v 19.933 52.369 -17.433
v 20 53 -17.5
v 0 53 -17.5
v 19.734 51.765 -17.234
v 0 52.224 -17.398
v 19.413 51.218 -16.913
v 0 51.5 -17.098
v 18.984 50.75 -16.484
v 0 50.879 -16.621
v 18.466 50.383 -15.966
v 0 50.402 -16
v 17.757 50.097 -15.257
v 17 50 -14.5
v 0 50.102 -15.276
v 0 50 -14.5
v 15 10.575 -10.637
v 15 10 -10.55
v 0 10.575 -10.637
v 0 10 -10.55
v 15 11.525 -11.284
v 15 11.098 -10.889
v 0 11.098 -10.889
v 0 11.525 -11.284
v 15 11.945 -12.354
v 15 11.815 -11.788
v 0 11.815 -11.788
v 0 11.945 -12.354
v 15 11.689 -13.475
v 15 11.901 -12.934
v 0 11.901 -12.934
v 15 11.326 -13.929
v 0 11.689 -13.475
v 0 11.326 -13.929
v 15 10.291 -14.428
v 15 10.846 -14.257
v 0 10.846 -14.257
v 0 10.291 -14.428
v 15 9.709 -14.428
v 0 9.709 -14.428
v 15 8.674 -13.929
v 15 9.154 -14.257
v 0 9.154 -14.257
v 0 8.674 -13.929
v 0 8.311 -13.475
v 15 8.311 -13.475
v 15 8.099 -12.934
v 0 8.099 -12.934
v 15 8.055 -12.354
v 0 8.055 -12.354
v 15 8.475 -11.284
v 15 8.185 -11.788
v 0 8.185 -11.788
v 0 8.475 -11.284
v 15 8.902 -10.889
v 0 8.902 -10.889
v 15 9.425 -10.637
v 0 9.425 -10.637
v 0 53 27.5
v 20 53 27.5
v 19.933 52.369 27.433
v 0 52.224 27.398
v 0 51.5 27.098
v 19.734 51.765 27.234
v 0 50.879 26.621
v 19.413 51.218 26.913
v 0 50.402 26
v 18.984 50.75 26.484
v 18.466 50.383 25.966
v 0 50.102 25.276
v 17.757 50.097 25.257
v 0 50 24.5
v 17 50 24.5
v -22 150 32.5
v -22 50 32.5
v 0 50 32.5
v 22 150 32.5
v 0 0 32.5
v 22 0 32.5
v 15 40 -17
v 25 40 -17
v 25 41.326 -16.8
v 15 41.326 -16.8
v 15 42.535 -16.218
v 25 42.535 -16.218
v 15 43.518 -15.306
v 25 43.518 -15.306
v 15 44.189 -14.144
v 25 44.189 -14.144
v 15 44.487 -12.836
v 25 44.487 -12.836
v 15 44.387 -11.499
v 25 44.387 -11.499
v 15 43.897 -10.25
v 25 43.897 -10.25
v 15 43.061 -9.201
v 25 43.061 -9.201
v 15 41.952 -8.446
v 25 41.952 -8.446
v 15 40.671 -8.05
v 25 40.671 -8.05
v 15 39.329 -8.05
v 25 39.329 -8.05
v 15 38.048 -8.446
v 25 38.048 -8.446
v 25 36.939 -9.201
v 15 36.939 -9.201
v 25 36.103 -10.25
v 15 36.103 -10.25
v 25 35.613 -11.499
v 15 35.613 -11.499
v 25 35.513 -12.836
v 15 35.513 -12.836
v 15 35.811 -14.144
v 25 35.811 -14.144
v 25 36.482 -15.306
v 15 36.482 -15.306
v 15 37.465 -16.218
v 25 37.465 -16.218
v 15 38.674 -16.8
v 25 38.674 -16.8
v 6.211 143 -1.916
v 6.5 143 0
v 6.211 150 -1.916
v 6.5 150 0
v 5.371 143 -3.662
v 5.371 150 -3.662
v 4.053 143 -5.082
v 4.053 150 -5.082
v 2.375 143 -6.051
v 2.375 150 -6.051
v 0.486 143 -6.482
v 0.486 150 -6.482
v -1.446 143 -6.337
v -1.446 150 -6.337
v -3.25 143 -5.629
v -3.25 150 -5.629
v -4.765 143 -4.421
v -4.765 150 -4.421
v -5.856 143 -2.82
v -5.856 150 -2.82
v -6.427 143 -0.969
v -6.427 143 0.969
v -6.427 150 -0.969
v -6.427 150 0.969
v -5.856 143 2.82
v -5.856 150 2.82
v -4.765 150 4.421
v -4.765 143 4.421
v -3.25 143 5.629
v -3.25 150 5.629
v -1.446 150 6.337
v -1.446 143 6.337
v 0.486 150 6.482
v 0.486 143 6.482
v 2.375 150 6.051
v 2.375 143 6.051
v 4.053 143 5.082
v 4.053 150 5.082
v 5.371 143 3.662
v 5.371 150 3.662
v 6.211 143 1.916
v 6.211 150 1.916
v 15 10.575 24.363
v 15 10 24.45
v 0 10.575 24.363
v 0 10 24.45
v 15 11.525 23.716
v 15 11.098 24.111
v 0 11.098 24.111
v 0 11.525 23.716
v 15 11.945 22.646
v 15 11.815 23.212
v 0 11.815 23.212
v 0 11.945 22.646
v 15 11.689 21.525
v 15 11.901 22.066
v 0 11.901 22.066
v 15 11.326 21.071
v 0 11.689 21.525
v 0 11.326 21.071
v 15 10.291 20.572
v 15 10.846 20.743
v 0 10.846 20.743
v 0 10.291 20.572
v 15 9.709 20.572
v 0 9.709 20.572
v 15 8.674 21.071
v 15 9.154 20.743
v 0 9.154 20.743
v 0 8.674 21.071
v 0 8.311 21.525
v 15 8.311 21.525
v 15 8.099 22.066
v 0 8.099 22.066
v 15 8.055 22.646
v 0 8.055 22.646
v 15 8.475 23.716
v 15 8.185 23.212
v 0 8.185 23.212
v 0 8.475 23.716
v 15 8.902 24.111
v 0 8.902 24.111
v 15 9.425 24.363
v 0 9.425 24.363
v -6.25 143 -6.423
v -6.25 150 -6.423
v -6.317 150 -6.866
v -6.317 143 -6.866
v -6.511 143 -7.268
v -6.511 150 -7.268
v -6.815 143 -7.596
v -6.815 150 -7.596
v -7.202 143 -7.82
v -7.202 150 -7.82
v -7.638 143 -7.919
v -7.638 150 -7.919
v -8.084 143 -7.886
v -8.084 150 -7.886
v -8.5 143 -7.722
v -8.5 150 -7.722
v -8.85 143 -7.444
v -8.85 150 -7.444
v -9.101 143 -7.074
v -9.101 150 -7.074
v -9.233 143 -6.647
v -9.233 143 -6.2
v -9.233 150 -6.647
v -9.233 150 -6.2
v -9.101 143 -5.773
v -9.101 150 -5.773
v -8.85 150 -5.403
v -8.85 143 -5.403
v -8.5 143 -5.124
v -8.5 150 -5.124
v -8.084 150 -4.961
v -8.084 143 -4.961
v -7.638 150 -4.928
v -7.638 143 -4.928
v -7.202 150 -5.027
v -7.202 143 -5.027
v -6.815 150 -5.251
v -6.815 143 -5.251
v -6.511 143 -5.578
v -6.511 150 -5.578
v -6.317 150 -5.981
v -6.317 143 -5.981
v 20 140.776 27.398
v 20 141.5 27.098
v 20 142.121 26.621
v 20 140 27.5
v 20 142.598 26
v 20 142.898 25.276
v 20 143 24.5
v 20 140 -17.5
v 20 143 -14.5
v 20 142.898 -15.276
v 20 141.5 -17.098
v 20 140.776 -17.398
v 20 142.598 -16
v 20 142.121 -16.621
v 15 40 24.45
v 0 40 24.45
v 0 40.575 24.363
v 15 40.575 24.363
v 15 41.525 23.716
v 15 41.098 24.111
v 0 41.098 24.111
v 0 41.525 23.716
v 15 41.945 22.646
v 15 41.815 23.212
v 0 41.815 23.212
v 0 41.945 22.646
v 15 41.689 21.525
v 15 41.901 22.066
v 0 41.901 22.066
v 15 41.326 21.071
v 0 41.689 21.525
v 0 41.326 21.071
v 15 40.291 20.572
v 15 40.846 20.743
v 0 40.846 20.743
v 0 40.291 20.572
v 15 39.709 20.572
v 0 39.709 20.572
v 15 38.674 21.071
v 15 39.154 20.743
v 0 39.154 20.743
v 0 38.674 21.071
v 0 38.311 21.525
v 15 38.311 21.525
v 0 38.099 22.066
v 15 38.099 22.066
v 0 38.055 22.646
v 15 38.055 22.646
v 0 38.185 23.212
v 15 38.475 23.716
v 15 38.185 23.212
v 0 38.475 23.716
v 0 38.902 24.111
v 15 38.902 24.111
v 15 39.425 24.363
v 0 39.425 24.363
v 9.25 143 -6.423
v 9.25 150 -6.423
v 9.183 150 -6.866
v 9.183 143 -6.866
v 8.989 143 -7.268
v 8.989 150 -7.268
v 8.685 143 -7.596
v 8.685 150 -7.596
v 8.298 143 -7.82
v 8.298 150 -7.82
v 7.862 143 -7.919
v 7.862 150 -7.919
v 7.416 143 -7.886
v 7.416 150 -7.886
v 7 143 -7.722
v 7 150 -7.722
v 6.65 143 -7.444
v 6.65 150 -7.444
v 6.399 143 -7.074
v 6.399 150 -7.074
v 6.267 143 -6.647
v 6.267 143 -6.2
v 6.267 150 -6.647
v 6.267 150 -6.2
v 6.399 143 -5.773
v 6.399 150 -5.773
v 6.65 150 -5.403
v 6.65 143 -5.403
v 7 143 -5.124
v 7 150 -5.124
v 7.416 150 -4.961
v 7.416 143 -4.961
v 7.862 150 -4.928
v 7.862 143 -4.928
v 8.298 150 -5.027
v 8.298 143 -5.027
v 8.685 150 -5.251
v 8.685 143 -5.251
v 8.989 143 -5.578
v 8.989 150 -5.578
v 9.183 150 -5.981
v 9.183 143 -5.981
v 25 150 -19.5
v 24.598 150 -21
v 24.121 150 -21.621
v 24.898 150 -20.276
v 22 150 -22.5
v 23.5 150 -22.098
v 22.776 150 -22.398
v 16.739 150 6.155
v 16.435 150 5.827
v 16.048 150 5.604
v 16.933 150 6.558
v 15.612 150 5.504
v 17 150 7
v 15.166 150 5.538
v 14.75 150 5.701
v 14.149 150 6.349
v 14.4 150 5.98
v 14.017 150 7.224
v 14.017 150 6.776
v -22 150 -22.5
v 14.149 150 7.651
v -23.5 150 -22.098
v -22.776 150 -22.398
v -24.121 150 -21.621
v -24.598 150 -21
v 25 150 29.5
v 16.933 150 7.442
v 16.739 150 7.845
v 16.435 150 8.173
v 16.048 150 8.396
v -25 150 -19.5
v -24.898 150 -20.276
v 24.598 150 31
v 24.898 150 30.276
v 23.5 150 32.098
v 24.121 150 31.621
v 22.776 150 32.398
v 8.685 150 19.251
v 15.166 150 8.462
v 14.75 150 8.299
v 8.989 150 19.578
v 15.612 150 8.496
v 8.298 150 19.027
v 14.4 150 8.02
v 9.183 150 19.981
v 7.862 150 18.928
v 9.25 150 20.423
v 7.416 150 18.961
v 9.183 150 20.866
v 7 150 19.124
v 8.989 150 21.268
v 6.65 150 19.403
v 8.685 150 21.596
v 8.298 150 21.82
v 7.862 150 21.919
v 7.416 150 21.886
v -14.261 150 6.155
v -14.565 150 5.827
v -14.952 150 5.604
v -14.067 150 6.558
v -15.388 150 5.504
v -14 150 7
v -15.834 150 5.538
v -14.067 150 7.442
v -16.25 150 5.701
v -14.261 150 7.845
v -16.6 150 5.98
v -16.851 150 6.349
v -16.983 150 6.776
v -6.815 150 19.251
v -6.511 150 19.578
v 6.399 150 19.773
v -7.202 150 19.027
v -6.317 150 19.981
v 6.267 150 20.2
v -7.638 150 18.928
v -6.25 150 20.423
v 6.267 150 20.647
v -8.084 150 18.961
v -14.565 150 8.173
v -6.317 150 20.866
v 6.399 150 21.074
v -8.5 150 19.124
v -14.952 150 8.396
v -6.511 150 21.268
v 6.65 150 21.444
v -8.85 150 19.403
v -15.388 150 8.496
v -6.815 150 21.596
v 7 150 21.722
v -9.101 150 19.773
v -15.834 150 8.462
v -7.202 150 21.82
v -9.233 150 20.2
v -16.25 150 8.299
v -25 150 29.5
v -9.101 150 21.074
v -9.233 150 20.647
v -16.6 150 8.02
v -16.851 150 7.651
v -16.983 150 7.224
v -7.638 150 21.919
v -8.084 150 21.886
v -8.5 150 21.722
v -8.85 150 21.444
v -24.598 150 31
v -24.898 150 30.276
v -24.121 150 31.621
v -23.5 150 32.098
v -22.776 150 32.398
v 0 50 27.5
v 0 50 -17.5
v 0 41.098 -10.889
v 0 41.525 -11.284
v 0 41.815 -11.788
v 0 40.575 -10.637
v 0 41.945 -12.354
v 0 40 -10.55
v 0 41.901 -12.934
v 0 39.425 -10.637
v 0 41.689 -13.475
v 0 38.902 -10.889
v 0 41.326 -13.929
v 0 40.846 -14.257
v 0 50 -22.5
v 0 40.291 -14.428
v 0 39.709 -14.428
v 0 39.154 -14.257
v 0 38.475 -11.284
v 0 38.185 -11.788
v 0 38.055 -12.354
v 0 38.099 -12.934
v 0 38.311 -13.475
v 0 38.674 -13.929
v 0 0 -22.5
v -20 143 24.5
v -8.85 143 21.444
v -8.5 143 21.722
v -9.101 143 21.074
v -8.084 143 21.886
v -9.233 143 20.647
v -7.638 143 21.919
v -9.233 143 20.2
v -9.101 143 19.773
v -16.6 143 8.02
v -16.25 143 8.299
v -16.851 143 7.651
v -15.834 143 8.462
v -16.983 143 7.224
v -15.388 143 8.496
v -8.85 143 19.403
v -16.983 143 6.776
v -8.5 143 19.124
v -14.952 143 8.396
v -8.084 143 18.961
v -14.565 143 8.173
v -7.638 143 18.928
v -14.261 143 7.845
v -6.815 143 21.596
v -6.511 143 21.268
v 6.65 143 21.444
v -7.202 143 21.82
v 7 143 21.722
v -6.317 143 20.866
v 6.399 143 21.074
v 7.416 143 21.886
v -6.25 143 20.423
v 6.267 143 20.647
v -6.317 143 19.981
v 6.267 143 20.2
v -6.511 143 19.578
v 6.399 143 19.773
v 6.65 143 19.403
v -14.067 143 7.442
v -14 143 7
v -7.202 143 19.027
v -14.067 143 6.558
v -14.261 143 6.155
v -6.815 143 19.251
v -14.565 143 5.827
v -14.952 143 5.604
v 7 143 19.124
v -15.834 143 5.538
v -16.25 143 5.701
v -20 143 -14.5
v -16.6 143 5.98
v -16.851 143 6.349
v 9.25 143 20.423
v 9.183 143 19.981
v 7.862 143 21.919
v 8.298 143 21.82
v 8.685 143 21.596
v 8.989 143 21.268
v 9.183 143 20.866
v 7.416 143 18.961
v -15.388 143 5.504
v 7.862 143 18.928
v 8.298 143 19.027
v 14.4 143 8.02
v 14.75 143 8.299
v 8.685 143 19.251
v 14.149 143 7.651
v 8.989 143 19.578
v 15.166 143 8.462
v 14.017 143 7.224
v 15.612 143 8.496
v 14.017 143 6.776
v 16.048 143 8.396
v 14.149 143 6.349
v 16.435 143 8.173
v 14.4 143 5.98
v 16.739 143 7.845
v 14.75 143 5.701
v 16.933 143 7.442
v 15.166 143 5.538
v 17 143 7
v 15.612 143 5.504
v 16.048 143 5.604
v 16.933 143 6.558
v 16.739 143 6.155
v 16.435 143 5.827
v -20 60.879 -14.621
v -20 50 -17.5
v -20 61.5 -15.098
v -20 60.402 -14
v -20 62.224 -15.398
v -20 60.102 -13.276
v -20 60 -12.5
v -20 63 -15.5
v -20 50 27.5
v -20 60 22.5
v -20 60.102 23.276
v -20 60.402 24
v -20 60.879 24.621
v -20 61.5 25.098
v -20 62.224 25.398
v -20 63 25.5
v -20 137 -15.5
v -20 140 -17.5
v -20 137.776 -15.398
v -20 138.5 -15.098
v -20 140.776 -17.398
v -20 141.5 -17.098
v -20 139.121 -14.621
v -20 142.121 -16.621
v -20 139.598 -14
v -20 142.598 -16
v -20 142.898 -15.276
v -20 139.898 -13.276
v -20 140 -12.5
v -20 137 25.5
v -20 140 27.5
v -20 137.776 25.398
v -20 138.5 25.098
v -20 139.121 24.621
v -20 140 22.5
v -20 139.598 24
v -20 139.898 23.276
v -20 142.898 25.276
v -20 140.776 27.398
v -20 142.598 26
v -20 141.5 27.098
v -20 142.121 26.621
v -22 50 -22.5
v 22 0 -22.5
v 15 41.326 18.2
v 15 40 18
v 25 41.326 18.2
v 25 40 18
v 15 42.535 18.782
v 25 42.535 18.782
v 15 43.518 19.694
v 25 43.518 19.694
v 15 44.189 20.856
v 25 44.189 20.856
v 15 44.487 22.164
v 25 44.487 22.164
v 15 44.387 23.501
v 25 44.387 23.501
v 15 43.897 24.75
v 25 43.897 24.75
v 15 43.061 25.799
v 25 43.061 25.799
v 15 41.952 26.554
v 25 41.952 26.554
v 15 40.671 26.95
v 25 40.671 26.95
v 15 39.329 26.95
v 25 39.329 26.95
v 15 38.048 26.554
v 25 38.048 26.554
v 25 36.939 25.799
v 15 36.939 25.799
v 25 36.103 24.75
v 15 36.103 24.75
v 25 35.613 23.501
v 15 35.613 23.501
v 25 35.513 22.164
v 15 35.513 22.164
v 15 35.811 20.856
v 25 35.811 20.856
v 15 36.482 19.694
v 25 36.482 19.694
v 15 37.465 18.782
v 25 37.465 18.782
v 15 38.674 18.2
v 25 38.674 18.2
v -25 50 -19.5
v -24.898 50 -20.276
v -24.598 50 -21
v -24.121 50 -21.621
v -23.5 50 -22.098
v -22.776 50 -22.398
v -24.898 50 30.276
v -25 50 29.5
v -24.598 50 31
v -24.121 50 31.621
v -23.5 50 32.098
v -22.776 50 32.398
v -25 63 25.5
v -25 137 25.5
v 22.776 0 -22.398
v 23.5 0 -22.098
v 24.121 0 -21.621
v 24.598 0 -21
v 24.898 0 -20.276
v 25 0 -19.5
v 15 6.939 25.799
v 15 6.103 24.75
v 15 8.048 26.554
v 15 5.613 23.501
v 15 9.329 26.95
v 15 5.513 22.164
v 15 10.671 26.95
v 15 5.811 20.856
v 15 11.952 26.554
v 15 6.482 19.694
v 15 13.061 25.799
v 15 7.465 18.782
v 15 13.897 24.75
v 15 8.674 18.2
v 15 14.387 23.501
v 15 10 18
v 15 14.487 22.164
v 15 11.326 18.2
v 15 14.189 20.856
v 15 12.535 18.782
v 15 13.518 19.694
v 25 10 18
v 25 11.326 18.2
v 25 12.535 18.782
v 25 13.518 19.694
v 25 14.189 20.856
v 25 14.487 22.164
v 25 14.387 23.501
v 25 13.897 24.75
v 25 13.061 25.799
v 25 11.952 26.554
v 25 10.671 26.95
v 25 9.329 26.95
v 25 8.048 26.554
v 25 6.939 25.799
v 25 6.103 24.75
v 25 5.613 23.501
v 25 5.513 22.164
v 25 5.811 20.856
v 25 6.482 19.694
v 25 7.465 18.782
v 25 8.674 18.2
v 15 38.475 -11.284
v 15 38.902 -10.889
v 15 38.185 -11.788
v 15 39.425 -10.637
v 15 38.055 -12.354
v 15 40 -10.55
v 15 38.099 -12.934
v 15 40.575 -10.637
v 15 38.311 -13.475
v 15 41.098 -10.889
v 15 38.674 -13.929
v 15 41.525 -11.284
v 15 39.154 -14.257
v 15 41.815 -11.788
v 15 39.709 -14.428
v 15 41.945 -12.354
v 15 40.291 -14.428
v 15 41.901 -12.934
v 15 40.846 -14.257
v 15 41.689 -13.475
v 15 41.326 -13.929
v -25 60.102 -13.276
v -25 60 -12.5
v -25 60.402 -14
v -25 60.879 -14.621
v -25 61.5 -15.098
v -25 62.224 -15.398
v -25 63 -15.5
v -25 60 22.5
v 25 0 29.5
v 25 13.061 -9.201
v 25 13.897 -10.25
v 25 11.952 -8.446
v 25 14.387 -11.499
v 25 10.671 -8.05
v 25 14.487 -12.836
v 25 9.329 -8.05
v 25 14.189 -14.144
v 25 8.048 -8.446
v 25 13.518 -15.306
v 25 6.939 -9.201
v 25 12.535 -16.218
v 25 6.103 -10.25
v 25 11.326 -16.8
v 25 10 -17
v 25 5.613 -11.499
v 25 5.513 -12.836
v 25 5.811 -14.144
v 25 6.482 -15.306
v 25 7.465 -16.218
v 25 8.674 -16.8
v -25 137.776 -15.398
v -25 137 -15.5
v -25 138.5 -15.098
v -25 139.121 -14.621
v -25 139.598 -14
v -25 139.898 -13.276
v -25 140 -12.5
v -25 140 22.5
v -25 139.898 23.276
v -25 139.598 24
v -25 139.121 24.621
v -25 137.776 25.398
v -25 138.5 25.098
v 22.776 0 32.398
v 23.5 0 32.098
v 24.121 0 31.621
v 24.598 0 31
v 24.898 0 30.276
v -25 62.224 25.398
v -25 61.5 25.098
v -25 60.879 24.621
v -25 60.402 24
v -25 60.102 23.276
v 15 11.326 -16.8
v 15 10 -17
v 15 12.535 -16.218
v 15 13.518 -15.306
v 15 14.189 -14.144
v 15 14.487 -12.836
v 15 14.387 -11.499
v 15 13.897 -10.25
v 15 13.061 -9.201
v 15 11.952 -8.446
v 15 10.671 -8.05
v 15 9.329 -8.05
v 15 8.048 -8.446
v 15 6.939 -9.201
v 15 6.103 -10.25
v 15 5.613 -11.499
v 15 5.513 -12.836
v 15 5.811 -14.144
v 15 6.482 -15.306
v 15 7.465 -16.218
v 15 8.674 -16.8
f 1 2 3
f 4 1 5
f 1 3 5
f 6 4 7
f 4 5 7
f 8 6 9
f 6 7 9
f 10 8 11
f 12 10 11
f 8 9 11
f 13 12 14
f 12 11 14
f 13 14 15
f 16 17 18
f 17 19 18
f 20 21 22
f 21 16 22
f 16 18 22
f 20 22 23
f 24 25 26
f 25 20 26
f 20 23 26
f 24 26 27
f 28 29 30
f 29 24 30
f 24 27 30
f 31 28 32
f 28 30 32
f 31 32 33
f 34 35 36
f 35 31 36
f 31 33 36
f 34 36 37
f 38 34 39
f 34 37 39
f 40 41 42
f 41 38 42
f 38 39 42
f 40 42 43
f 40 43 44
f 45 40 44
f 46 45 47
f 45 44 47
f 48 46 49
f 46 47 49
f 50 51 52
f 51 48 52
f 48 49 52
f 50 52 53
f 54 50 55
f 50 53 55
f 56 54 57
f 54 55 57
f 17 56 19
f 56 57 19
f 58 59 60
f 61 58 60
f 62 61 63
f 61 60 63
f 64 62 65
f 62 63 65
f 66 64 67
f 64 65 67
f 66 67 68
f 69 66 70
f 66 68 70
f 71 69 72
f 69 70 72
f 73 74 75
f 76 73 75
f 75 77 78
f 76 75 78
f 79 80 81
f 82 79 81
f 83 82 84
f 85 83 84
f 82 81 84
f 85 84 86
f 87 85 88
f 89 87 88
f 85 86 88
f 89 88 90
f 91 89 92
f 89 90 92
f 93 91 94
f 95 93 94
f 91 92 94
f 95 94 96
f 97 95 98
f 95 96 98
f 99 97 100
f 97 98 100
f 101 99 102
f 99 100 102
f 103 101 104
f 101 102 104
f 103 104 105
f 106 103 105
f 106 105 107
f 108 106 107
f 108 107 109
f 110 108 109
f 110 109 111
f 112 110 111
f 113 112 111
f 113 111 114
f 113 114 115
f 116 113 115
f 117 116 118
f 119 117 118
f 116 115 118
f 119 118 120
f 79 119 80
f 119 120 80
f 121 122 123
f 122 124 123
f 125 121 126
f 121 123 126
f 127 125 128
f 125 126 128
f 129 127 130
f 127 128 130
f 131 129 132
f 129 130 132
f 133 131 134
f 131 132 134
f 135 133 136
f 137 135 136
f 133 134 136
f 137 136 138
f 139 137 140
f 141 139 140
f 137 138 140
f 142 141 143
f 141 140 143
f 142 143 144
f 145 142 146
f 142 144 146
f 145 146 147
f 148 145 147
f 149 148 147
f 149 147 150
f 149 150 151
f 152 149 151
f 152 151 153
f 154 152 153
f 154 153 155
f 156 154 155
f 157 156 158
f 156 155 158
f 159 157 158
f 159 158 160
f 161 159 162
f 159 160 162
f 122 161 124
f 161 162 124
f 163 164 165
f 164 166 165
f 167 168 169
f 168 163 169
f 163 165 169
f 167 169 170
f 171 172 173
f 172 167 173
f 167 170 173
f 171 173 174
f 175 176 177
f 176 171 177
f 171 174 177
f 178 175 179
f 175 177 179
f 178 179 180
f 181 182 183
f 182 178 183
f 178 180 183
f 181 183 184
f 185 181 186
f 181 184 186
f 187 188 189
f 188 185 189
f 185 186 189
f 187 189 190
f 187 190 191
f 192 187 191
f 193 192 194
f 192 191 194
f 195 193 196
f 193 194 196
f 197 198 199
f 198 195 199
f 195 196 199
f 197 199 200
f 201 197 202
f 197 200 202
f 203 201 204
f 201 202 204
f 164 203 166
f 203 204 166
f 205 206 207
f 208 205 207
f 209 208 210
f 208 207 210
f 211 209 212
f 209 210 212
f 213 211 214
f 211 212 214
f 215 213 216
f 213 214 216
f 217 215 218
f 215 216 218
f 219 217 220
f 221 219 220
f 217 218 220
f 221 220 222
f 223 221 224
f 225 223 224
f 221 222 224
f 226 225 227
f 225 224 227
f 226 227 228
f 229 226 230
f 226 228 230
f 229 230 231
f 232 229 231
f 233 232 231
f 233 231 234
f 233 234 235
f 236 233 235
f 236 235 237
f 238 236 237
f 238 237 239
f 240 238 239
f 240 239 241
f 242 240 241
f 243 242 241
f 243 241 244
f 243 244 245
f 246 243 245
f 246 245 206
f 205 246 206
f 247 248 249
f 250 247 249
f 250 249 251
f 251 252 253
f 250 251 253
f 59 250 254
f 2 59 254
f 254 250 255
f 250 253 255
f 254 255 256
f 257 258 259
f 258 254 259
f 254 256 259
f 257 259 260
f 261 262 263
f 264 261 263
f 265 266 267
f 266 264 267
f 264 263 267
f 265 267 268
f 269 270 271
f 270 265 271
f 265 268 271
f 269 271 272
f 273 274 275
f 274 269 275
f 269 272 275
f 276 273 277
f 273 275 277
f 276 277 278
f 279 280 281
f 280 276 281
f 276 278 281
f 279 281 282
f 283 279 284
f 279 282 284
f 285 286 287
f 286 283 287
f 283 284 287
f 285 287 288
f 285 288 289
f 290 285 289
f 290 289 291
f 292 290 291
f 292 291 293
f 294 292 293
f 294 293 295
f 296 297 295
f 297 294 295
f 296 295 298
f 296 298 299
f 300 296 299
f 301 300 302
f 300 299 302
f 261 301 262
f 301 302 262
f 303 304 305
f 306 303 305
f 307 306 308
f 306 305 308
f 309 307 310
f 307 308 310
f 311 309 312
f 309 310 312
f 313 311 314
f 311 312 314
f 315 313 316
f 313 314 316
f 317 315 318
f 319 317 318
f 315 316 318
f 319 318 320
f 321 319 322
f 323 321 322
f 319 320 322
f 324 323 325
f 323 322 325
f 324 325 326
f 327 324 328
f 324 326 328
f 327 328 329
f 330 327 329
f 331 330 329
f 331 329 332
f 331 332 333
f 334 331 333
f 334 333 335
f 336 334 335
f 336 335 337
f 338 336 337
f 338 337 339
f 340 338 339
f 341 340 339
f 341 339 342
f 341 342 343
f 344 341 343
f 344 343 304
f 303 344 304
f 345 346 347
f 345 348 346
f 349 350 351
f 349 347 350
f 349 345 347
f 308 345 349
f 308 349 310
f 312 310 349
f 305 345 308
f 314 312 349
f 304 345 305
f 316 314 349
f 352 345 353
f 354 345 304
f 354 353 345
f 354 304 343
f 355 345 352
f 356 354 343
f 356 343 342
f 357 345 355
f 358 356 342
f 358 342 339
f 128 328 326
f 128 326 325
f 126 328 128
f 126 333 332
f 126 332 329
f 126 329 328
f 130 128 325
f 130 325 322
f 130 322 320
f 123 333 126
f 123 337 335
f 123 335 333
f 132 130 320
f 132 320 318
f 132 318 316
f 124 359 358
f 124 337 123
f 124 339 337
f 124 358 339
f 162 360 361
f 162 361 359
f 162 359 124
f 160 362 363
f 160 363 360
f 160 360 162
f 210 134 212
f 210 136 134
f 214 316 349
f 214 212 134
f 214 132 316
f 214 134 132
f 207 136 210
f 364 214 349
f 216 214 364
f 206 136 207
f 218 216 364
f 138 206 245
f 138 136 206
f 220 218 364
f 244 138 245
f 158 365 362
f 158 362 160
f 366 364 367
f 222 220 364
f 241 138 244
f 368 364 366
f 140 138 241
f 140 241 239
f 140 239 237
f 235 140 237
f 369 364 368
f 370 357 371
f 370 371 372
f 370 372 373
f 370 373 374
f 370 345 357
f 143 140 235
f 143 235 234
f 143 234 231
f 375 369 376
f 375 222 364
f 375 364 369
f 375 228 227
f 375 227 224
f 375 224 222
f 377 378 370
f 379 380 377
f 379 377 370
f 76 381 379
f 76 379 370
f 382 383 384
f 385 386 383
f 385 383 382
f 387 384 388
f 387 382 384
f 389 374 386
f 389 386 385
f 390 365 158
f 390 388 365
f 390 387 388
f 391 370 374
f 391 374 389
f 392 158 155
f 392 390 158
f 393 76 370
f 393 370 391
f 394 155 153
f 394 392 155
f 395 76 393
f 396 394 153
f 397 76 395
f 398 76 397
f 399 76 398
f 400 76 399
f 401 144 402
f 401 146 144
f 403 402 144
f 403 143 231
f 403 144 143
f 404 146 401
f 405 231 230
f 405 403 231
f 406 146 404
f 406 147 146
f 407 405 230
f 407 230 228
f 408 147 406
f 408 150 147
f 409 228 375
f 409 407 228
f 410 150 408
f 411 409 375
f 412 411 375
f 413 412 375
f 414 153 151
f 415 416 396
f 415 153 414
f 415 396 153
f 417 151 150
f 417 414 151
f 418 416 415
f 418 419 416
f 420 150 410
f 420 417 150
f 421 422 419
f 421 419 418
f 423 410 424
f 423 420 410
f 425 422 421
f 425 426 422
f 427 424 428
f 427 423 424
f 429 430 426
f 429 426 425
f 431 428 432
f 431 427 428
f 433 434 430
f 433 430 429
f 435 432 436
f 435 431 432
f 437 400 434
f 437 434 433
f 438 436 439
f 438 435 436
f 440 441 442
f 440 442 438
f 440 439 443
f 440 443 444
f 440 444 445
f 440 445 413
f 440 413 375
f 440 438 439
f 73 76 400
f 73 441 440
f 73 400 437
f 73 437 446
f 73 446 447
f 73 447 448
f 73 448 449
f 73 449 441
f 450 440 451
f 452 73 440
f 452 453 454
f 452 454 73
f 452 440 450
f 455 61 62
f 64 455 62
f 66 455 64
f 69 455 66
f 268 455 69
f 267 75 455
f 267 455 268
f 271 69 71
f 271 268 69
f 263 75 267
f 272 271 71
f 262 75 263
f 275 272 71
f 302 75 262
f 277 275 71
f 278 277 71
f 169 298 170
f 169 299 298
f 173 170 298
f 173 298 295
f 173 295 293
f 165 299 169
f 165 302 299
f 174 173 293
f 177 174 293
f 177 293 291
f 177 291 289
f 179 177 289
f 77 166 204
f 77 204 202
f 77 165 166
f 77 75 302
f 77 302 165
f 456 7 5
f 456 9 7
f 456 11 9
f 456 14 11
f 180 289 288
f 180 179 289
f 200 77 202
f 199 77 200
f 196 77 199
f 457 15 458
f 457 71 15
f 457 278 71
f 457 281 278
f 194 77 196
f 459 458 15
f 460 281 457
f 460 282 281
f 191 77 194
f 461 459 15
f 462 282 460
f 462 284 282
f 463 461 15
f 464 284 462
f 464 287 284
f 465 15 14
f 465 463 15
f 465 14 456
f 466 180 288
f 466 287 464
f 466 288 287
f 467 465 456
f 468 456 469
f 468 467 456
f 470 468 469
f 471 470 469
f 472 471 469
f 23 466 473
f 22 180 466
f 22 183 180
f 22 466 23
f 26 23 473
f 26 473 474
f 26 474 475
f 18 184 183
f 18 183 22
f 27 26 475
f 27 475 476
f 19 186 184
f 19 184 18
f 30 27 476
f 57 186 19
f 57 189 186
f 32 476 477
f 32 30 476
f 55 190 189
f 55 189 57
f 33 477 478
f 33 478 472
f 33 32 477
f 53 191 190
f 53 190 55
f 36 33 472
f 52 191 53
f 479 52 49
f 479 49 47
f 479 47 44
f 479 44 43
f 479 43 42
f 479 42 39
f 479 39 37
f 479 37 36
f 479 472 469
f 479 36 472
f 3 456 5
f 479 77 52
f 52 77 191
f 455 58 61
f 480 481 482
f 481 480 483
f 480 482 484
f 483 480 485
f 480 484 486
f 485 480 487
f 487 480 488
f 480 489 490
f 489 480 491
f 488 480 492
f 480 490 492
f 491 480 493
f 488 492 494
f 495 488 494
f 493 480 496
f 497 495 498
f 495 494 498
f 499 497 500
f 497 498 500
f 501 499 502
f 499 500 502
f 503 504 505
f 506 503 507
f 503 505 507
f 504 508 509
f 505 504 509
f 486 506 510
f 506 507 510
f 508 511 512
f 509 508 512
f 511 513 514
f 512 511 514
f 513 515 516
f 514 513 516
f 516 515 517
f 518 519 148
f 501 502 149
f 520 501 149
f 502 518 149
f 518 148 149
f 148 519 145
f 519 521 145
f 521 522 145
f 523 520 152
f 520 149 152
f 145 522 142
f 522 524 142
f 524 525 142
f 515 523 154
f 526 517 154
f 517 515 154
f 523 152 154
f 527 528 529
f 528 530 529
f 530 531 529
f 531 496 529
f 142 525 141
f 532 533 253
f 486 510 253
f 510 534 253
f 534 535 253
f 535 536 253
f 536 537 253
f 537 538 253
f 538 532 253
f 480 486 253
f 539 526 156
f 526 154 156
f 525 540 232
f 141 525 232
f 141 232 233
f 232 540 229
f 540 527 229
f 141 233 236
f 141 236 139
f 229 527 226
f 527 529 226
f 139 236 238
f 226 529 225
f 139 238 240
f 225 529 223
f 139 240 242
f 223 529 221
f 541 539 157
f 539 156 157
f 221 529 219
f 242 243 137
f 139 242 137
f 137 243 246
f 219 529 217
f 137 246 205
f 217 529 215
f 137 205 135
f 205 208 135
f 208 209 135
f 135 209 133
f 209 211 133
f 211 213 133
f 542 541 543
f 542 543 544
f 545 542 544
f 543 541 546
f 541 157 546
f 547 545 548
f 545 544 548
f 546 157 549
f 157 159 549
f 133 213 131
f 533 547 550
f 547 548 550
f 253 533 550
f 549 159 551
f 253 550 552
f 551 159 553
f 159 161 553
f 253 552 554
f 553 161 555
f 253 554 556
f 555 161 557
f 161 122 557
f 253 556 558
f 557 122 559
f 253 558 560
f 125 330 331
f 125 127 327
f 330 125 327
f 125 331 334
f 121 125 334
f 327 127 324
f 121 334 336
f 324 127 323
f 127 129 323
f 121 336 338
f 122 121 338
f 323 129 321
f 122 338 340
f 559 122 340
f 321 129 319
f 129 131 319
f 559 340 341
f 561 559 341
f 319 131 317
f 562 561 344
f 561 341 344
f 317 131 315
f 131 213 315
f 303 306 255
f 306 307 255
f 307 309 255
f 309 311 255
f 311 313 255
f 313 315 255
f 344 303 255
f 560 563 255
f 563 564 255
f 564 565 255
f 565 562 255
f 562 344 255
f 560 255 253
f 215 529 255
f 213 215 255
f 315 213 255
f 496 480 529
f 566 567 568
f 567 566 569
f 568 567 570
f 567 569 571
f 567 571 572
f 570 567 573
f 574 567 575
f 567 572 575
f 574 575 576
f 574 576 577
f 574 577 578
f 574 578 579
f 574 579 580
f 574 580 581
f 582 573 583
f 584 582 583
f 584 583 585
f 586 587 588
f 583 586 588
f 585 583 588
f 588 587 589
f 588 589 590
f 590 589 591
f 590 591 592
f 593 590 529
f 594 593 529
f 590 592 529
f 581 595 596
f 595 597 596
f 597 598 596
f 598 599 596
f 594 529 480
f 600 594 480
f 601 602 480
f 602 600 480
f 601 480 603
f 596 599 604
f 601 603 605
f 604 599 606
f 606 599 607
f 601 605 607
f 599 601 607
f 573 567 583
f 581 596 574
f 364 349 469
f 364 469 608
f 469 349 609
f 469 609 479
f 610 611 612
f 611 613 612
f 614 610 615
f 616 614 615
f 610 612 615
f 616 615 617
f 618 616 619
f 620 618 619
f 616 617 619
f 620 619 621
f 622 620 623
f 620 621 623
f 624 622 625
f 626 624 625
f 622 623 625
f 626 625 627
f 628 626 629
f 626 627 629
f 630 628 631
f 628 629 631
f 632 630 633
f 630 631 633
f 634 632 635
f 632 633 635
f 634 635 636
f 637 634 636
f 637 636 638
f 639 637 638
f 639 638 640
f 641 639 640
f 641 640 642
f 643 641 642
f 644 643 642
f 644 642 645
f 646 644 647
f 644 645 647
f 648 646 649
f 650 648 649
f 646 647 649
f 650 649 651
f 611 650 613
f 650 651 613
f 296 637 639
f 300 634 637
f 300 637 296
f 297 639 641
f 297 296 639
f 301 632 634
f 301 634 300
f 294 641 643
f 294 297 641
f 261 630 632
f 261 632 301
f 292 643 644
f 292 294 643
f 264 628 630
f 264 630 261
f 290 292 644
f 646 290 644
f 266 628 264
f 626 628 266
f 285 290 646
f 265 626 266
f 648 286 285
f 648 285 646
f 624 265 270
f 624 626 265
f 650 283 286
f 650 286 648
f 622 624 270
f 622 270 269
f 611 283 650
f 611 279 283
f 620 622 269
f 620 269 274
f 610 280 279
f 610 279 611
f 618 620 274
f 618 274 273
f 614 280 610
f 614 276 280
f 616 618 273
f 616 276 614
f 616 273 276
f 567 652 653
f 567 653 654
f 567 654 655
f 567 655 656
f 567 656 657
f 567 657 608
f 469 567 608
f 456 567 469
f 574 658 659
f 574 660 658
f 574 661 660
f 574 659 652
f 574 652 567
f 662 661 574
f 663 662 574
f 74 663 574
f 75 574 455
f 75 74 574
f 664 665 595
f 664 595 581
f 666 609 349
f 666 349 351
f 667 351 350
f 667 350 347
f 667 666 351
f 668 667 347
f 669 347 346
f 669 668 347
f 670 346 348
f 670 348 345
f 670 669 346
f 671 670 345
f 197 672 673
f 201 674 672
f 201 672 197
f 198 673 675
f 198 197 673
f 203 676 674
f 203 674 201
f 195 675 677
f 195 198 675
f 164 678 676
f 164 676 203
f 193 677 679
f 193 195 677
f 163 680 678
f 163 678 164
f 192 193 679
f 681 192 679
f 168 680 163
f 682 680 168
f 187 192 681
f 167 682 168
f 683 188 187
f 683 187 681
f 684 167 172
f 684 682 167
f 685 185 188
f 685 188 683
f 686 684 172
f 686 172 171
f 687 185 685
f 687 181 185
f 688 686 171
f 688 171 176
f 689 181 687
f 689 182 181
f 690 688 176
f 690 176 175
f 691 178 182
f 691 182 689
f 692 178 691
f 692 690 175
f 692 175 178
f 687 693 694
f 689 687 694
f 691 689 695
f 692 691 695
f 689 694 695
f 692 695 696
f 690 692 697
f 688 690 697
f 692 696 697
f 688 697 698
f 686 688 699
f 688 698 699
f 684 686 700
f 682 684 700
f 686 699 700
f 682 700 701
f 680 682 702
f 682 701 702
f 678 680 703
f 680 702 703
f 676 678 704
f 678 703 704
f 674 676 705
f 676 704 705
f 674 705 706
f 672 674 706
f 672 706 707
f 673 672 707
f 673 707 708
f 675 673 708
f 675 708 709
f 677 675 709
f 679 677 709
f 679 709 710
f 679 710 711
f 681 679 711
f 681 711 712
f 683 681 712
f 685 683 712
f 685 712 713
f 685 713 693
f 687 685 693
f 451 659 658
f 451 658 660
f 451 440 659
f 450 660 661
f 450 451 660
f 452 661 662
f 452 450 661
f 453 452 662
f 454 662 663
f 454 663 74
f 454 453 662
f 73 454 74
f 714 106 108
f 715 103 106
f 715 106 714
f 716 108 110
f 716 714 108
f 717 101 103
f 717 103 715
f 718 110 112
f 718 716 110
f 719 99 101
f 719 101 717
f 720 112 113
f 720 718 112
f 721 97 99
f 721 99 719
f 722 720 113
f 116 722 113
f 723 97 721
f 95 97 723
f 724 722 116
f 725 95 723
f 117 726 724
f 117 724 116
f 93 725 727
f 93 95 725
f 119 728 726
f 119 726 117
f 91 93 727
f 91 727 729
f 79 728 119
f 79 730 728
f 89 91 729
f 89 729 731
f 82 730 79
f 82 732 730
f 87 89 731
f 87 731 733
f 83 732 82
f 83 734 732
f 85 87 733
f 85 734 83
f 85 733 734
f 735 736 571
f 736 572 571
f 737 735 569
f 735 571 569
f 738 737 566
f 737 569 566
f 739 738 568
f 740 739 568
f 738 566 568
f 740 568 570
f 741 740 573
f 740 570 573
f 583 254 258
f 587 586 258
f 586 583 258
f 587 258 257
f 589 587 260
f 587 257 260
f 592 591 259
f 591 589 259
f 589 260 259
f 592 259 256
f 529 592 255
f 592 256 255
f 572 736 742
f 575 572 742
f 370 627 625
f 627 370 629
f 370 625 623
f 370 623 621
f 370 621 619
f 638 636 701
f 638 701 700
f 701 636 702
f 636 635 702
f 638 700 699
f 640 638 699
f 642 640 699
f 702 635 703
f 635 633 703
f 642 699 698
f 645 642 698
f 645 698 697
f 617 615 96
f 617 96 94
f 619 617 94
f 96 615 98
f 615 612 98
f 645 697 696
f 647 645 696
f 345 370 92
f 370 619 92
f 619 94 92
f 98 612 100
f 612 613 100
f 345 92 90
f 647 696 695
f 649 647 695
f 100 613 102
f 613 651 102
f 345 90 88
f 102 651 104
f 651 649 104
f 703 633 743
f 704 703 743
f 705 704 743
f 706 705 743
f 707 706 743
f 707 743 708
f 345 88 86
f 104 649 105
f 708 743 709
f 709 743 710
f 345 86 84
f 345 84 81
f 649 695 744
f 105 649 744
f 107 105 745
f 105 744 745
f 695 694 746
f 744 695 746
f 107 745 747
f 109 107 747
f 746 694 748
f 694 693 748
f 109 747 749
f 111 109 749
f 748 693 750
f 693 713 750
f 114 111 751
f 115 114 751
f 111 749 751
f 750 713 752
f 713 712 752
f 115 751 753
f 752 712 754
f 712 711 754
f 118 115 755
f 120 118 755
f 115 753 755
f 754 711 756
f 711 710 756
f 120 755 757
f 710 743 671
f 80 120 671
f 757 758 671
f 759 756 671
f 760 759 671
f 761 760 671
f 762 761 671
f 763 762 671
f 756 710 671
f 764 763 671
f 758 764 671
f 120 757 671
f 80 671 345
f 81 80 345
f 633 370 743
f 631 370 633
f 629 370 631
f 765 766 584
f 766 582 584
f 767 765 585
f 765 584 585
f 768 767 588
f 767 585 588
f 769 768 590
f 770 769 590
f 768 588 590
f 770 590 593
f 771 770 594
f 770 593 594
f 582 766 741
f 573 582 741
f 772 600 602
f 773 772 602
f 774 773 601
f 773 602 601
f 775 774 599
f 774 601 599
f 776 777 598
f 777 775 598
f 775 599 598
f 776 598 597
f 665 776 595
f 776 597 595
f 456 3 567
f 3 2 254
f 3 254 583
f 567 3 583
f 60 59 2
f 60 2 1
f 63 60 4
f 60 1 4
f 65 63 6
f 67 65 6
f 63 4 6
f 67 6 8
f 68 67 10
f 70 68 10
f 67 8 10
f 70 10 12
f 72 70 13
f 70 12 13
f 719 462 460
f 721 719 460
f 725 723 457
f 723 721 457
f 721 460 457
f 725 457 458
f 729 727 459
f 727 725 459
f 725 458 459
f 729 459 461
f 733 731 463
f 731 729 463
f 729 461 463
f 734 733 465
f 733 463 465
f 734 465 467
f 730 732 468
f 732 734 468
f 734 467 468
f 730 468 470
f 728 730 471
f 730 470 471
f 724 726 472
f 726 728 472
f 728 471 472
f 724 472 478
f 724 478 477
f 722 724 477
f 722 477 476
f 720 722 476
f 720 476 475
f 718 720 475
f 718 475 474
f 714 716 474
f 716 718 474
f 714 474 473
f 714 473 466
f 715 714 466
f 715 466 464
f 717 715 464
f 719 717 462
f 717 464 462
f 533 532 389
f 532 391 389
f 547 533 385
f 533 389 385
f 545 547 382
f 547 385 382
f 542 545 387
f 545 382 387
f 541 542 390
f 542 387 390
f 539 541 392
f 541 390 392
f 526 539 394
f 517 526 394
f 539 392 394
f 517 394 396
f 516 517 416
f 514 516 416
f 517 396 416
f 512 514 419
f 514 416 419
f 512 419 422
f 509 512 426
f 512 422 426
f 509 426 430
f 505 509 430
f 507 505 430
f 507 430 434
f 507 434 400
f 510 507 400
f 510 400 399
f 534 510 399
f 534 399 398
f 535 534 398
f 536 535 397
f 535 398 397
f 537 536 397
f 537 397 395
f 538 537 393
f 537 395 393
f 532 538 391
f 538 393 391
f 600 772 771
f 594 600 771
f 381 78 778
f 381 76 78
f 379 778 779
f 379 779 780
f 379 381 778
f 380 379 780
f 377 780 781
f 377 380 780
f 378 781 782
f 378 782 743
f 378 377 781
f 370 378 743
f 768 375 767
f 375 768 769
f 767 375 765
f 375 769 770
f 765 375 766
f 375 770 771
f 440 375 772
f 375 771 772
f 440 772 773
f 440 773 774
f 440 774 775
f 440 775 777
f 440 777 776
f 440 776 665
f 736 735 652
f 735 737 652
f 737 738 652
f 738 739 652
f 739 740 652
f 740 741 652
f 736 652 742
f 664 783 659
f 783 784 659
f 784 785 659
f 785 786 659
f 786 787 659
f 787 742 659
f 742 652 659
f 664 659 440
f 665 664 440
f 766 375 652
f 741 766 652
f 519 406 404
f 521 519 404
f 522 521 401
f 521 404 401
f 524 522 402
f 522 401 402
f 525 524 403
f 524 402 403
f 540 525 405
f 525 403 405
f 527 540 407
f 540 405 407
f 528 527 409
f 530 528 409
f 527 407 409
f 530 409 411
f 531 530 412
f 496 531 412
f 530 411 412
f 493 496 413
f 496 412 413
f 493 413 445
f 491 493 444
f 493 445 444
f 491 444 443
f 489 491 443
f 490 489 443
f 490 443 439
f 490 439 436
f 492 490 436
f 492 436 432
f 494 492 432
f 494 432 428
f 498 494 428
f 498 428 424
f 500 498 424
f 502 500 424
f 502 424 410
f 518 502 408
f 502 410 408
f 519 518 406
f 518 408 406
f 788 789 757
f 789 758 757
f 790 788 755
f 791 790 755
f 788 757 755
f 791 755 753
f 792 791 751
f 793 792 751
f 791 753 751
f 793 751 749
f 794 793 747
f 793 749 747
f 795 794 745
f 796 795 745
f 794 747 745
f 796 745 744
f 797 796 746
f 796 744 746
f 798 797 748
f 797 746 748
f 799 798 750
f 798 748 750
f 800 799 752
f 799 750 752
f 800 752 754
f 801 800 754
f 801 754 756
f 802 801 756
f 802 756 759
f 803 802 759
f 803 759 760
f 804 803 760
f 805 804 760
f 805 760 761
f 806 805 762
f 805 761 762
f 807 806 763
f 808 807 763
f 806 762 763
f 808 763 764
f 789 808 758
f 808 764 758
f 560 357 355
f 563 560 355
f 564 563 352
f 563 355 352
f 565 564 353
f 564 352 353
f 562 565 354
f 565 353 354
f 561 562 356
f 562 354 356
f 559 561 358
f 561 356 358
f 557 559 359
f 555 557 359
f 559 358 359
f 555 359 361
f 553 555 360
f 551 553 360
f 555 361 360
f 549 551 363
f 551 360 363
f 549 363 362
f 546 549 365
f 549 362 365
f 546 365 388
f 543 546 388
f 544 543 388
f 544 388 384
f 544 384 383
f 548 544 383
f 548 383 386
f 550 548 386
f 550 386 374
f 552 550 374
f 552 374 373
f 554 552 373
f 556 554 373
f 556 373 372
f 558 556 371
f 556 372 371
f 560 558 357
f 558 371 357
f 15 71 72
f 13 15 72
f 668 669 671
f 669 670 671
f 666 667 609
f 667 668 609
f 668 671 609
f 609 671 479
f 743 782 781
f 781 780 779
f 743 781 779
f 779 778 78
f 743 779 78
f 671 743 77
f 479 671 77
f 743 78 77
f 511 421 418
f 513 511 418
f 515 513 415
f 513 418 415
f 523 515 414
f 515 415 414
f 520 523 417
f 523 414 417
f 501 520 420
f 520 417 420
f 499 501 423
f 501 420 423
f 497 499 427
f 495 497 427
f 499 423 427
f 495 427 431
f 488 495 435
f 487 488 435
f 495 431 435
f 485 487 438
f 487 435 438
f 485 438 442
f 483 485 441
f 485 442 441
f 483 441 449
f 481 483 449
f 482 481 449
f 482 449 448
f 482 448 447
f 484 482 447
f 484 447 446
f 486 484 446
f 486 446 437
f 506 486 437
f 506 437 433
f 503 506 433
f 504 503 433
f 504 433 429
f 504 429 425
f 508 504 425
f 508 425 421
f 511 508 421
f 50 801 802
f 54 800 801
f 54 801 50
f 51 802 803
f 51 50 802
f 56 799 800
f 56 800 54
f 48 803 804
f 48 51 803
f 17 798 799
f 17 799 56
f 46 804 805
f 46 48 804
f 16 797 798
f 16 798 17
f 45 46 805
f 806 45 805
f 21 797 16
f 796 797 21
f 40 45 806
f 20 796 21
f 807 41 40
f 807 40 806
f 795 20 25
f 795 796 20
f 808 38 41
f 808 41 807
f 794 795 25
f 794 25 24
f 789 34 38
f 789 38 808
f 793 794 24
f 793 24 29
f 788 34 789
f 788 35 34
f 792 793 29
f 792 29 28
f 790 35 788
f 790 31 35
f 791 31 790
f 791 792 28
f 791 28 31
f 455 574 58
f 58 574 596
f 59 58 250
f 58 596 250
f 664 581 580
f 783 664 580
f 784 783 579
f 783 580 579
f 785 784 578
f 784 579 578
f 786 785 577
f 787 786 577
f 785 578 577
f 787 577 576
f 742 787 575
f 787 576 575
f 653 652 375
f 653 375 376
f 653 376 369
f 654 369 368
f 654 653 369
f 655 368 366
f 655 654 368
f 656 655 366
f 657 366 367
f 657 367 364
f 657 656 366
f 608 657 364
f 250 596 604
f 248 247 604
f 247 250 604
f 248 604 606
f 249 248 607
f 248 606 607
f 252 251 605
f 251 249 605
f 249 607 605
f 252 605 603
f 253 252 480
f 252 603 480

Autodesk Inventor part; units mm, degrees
ref_plane "YZ Plane" through (0, 0, 0) normal (1, 0, 0) x (0, 1, 0)
ref_plane "XZ Plane" through (0, 0, 0) normal (0, 1, 0) x (-1, 0, 0)
ref_plane "XY Plane" through (0, 0, 0) normal (0, 0, 1) x (1, 0, 0)
sketch "Sketch1" plane through (0, 0, 0) normal (0, 1, 0) x (-1, 0, 0)
  line L0 (25, 32.5) -> (-25, 32.5)
  line L1 (-25, 32.5) -> (-25, -22.5)
  line L2 (-25, -22.5) -> (25, -22.5)
  line L3 (25, -22.5) -> (25, 32.5)
  circle A0 centre (0, 0) radius 15.2541
  dimension "d0" = 50
  dimension "d1" = 55
  dimension "d2" = 22.5
  dimension "d3" = 25
extrude "Extrusion1" add sketch "Sketch1" along normal blind 150 contours L3 L2 L1 L0 | A0
sketch "Sketch2" plane through (0, 0, 0) normal (0, -1, 0) x (1, 0, 0)
  line L0 (-25, -22.5) -> (-25, 32.5) projected
  line L1 (-25, 32.5) -> (0, 32.5)
  line L2 (0, 32.5) -> (0, -22.5)
  line L3 (0, -22.5) -> (-25, -22.5)
  line L4 (-25, -22.5) -> (-25, 32.5)
  point P0 (0, 0)
extrude "Extrusion2" cut sketch "Sketch2" against normal blind 50
sketch "Sketch3" plane through (0, 150, 0) normal (0, 1, 0) x (1, 0, 0)
  line L0 (-25, 22.5) -> (-25, -32.5) projected
  line L1 (25, -32.5) -> (25, 22.5) projected
  line L2 (-25, -32.5) -> (25, -32.5)
  line L3 (25, -32.5) -> (25, 22.5)
  line L4 (25, 22.5) -> (-25, 22.5)
  line L5 (-25, 22.5) -> (-25, -32.5)
  line L6 (-20, -27.5) -> (20, -27.5)
  line L7 (20, -27.5) -> (20, 17.5)
  line L8 (20, 17.5) -> (-20, 17.5)
  line L9 (-20, 17.5) -> (-20, -27.5)
  point P0 (0, 0)
  dimension "d8" = 5
  dimension "d9" = 5
  dimension "d10" = 5
  dimension "d11" = 5
extrude "Extrusion3" cut sketch "Sketch3" against normal blind 100 contours L9 L8 L7 L6
fillet "Fillet1" radius 3 3 edges at (10, 50, -17.5) (20, 50, 5) (10, 50, 27.5)
sketch "Sketch4" plane through (0, 150, 0) normal (0, 1, 0) x (1, 0, 0)
  line L0 (25, -32.5) -> (25, 22.5) projected
  line L1 (-25, 22.5) -> (-25, -32.5) projected
  line L2 (25, -32.5) -> (-25, -32.5)
  line L3 (-25, -32.5) -> (-25, 22.5)
  line L4 (-25, 22.5) -> (25, 22.5)
  line L5 (25, 22.5) -> (25, -32.5)
  point P0 (0, 0)
extrude "Extrusion4" add sketch "Sketch4" against normal blind 7
sketch "Sketch5" plane through (0, 150, 0) normal (0, 1, 0) x (1, 0, 0)
  circle A0 centre (0, 0) radius 6.5
  line L0 (0, -24.5) -> (0, 14.5) projected
  circle A1 centre (0, -7) radius 15.5
  line L1 (9.6514, -23.7167) -> (0, -7)
  line L2 (0, -7) -> (-9.5909, -23.612)
  line L3 (0, -7) -> (-18.6754, -7)
  line L4 (0, -7) -> (9.4872, 9.4324)
  line L5 (0, -7) -> (16.3511, -7)
  line L6 (0, -7) -> (-10.3523, 10.9308)
  circle A2 centre (15.5, -7) radius 1.5
  circle A3 centre (7.75, -20.4234) radius 1.5
  circle A4 centre (-7.75, -20.4234) radius 1.5
  circle A5 centre (-15.5, -7) radius 1.5
  circle A6 centre (-7.75, 6.4234) radius 1.5
  circle A7 centre (7.75, 6.4234) radius 1.5
  dimension "d17" = 31
  dimension "d18" = 7
  dimension "d19" = 13
  dimension "d20" = 60
  dimension "d21" = 60
  dimension "d22" = 60
  dimension "d23" = 60
  dimension "d24" = 60
  dimension "d25" = 30
  dimension "d26" = 3
  dimension "d27" = 3
  dimension "d28" = 3
  dimension "d29" = 3
  dimension "d30" = 3
  dimension "d31" = 3
extrude "Extrusion5" cut sketch "Sketch5" against normal blind 7 contours A0 L4 | L4 A0 L0 | L0 A0 L6 | A7 A1 L4 | L4 A1 A7 | L6 A0 | L4 A7 A1 | A1 A7 L4 | A3 A1 L1 | L1 A1 A3 | A4 A1 L2 | L2 A1 A4 | A5 A1 L3 | L3 A1 A5 | A2 A1 L5 | L5 A1 A2 | A6 A1 L6 | L6 A1 A6 | A1 L6 A6 | A2 A1 | A4 L2 A1 | A1 L1 A3 | A1 A3 L1 | L2 A4 A1 | L3 A5 A1 | A1 A5 L3 | A1 A6 L6 picked at (1.7263, 1.3919) picked at (-2.6431, 1.1884)
fillet "Fillet2" radius 3 2 edges at (0, 143, -17.5) (0, 143, 27.5)
fillet "Fillet3" radius 3 4 edges at (25, 75, 32.5) (25, 75, -22.5) (-25, 100, -22.5) (-25, 100, 32.5)
sketch "Sketch6" plane through (-25, 50, 29.5) normal (-1, 0, 0) x (0, 0, 1)
  line L0 (-2, 90) -> (-2, 0) projected
  line L1 (-47, 90) -> (-47, 3) projected
  line L2 (-2, 90) -> (-47, 90)
  line L3 (-47, 90) -> (-47, 10)
  line L4 (-47, 10) -> (-2, 10)
  line L5 (-2, 10) -> (-2, 90)
  line L6 (-49, 0) -> (0, 0) projected
  line L7 (-49, 100) -> (0, 100) projected
  line L8 (-4, 90) -> (-4, 10)
  line L9 (-45, 90) -> (-45, 10)
  line L10 (-52, 100) -> (-52, 0) projected
  point P0 (-29.5, -50)
  point P1 (3, 0)
  dimension "d36" = 10
  dimension "d38" = 10
  dimension "d39" = 7
  dimension "d40" = 7
extrude "Extrusion6" cut sketch "Sketch6" against normal blind 7 contours L8 L4 L9 L2
fillet "Fillet4" radius 3 4 edges at (-22.5, 140, 25.5) (-22.5, 60, 25.5) (-22.5, 60, -15.5) (-22.5, 140, -15.5)
sketch "Sketch7" plane through (0, 0, -22.5) normal (-1, 0, 0) x (0, 0, 1)
  line L0 (45, 40) -> (10, 40)
  line L1 (10, 40) -> (10, 10)
  line L2 (10, 10) -> (45, 10)
  line L3 (45, 10) -> (45, 40)
  line L4 (55, 50) -> (55, 0) projected
  line L5 (55, 0) -> (0, 0) projected
  line L6 (0, 0) -> (0, 50) projected
  line L7 (3, 50) -> (52, 50) projected
  circle A0 centre (45, 10) radius 1.95
  circle A1 centre (45, 40) radius 1.95
  circle A2 centre (10, 40) radius 1.95
  circle A3 centre (10, 10) radius 1.95
  point P0 (22.5, 0)
  dimension "d44" = 10
  dimension "d45" = 10
  dimension "d46" = 10
  dimension "d47" = 10
  dimension "d48" = 3.9
  dimension "d49" = 3.9
  dimension "d50" = 3.9
  dimension "d51" = 3.9
extrude "Extrusion7" cut sketch "Sketch7" against normal blind 25 contours A2 L1 L0 | L0 L1 A2 | A1 L3 L0 | L0 L3 A1 | A3 L2 L1 | L1 L2 A3 | A0 L2 L3 | L3 L2 A0
sketch "Sketch8" plane through (25, 0, 29.5) normal (1, 0, 0) x (0, 0, -1)
  circle A0 centre (7, 10) radius 1.95 projected
  circle A1 centre (7, 10) radius 4.5
  circle A2 centre (7, 40) radius 1.95 projected
  circle A3 centre (7, 40) radius 4.5
  circle A4 centre (42, 40) radius 1.95 projected
  circle A5 centre (42, 40) radius 4.5
  circle A6 centre (42, 10) radius 1.95 projected
  circle A7 centre (42, 10) radius 4.5
  point P0 (29.5, 0)
  dimension "d54" = 9
  dimension "d55" = 9
  dimension "d56" = 9
  dimension "d57" = 9
extrude "Extrusion8" cut sketch "Sketch8" against normal blind 10
properties part number "Link2_v2b"
